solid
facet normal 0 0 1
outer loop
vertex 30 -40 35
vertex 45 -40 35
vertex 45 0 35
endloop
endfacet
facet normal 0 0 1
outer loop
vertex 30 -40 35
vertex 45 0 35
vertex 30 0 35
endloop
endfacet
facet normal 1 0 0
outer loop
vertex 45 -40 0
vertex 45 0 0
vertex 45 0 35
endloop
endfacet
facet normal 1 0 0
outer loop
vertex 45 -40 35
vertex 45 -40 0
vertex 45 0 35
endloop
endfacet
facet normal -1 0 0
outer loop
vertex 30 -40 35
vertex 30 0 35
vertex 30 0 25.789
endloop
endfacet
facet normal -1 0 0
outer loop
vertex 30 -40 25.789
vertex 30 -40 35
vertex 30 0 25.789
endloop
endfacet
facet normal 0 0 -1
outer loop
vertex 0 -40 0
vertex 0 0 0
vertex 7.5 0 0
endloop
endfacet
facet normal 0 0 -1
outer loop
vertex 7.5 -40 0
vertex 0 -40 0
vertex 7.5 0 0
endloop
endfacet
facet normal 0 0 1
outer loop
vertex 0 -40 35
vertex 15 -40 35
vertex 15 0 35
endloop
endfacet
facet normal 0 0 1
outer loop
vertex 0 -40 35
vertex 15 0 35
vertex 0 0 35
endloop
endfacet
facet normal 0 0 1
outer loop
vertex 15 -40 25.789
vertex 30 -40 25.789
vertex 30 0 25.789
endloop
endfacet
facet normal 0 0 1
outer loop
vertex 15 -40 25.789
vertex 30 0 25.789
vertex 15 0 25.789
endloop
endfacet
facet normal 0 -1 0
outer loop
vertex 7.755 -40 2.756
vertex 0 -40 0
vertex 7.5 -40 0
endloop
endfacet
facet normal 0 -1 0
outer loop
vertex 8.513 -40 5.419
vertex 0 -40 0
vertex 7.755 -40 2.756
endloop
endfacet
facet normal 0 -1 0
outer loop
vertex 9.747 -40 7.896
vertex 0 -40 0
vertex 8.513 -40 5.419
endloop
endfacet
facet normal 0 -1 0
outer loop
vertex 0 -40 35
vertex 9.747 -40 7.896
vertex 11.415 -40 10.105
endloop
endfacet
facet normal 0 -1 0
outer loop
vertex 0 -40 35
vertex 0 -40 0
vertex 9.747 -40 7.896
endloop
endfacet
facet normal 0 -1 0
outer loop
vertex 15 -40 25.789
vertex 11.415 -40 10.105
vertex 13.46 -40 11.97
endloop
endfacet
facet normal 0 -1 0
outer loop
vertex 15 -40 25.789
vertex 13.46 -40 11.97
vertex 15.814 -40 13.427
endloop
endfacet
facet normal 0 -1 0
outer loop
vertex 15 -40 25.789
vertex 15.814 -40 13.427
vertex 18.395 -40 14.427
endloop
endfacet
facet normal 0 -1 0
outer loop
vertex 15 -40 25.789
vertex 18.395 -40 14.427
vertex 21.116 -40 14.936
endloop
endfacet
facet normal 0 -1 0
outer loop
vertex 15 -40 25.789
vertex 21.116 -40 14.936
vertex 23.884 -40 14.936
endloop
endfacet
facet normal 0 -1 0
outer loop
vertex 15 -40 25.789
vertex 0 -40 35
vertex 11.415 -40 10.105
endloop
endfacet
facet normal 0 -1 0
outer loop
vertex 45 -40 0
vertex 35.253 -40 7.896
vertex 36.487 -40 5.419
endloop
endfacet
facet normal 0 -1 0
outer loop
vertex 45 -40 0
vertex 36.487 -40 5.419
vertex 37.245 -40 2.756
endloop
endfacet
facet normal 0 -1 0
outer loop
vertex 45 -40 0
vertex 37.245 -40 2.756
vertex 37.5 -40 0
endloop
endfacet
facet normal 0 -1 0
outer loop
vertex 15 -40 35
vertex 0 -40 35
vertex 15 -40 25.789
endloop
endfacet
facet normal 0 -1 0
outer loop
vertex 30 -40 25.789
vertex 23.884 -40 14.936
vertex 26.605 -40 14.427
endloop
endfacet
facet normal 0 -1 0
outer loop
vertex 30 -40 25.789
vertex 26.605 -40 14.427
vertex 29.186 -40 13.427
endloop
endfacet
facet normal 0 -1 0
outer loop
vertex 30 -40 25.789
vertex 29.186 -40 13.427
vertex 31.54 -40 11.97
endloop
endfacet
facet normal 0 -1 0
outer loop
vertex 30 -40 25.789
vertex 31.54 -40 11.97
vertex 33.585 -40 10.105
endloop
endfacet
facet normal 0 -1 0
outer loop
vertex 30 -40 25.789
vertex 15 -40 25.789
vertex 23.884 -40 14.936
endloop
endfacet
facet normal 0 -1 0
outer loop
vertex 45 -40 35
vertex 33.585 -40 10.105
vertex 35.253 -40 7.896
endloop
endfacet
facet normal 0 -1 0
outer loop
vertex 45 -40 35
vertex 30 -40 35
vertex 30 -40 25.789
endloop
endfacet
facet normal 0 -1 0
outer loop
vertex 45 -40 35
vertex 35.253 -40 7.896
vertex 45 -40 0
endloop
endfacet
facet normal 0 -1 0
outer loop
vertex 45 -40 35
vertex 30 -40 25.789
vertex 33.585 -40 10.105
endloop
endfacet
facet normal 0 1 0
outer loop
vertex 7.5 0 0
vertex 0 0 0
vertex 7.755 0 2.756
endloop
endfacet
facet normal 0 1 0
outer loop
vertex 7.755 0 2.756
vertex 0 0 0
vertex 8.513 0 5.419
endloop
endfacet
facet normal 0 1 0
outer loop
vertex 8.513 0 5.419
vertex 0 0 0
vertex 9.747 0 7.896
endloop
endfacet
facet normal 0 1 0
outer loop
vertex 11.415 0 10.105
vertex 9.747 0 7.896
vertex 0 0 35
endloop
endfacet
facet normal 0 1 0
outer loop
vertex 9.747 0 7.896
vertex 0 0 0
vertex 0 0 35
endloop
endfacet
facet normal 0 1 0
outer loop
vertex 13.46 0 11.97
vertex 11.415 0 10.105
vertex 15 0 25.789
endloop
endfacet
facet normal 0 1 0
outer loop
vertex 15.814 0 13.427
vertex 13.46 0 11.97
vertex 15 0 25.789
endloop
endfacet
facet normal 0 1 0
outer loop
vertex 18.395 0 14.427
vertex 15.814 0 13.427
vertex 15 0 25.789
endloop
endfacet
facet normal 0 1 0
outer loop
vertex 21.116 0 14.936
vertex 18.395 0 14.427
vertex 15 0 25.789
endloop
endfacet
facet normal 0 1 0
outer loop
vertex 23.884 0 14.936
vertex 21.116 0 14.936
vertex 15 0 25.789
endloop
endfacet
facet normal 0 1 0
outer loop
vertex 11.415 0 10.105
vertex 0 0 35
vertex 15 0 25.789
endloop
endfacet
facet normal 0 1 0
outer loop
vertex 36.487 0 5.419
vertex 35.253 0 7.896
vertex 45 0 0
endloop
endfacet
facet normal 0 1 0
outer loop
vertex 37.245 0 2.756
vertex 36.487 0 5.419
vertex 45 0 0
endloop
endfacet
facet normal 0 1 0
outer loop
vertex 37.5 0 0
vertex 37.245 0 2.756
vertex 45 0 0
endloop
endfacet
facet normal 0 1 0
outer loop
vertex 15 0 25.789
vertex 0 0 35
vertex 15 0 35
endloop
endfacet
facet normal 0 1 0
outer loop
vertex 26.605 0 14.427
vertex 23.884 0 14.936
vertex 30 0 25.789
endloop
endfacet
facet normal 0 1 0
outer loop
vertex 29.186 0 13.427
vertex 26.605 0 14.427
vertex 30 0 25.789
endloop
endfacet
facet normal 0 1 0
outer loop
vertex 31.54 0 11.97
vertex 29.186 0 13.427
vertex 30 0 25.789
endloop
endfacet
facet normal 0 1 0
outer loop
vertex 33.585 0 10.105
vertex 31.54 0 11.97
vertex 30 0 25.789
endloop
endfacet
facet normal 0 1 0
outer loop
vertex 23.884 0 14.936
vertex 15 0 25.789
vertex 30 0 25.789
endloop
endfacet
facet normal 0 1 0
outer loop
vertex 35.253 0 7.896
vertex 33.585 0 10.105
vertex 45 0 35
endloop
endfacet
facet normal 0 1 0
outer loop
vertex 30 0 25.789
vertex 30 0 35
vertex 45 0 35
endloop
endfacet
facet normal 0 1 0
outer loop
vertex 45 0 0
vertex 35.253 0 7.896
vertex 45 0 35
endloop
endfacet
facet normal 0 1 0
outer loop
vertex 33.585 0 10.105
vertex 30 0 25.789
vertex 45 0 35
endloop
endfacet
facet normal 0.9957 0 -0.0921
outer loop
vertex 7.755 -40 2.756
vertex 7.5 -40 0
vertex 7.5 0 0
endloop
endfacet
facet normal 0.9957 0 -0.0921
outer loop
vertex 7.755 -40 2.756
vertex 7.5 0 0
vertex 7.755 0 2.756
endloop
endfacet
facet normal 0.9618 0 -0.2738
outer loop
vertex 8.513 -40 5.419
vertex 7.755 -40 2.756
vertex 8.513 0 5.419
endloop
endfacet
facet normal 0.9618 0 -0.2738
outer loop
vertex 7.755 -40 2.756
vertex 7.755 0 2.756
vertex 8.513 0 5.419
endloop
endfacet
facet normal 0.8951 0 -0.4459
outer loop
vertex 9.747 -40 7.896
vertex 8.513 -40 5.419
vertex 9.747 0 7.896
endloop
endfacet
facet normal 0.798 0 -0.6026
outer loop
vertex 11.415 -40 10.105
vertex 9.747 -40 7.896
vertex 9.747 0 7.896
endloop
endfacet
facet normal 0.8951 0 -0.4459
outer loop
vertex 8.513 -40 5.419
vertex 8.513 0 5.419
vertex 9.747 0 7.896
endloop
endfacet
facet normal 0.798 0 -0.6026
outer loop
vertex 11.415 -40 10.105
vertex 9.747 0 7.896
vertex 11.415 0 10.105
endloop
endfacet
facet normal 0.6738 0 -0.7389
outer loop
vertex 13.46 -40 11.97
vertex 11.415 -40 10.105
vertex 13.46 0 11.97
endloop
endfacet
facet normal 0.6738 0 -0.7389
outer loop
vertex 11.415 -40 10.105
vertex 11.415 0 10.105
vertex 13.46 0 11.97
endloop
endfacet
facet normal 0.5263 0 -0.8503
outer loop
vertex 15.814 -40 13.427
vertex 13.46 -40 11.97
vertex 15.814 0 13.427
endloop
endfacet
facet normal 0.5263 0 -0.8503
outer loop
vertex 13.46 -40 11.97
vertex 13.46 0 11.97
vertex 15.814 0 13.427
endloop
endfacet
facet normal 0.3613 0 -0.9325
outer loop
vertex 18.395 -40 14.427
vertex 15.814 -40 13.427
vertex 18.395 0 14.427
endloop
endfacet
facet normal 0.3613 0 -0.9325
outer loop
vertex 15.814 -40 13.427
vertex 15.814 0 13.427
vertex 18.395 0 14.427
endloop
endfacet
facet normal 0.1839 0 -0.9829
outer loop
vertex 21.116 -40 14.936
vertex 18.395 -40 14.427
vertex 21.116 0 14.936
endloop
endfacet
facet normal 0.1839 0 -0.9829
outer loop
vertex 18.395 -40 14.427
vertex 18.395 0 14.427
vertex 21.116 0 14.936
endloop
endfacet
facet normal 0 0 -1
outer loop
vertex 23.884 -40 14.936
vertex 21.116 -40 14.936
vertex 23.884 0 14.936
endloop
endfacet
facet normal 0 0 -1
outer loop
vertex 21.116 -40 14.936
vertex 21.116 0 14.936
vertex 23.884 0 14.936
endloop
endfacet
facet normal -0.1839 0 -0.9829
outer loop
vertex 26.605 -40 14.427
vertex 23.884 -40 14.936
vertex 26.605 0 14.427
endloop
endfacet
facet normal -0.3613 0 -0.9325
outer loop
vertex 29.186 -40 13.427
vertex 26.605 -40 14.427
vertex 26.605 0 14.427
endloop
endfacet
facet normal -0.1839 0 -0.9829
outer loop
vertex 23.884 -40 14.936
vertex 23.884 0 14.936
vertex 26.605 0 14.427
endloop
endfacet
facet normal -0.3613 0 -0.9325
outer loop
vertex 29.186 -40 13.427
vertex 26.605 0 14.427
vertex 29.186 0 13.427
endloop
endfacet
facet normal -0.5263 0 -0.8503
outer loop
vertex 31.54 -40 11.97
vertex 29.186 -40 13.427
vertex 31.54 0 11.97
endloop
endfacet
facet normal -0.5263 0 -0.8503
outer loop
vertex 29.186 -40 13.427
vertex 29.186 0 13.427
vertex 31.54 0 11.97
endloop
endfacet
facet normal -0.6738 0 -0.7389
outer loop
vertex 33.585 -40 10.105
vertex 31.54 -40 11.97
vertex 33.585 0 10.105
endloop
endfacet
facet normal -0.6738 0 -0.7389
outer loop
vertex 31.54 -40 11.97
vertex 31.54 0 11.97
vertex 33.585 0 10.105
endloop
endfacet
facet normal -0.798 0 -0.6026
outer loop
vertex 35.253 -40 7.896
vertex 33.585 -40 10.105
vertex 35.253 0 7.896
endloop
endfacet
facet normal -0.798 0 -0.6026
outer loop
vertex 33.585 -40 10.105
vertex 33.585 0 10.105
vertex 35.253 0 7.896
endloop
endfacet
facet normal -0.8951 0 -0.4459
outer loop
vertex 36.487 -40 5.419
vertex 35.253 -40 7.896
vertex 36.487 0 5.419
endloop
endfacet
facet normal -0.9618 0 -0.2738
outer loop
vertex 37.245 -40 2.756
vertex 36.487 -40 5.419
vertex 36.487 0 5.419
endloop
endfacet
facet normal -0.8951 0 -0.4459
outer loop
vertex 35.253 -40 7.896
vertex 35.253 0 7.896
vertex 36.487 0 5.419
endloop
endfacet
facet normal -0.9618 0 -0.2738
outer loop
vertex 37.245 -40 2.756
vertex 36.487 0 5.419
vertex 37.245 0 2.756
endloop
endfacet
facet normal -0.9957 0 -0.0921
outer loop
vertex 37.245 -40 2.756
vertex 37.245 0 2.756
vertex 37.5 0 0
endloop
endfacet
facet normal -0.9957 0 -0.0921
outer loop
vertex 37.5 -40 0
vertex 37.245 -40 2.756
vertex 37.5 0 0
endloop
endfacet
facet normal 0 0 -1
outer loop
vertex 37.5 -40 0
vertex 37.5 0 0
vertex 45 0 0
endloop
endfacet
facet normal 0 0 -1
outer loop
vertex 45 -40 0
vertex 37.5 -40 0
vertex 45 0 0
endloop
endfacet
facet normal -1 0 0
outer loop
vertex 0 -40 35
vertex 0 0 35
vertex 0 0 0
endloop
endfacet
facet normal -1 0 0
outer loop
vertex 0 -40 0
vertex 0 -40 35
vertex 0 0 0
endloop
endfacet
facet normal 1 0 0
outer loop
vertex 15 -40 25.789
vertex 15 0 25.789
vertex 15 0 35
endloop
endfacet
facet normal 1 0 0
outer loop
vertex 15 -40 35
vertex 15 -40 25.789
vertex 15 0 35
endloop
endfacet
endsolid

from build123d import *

# Parameters (mm, degrees)
F1_DEPTH = 40


with BuildPart() as f1:
    # F0 (on Front) → F1 (new body)
    with BuildSketch(Plane.XZ):
        with BuildLine():
            Line((0, 35), (0, 0))
            Line((0, 0), (7.5, 0))
            ThreePointArc((7.5, 0), (22.5, 15), (37.5, 0))
            Line((37.5, 0), (45, 0))
            Line((45, 0), (45, 35))
            Line((45, 35), (30, 35))
            Line((30, 35), (30, 25.78854))
            Line((30, 25.78854), (15, 25.78854))
            Line((15, 25.78854), (15, 35))
            Line((15, 35), (0, 35))
        make_face()
    extrude(amount=F1_DEPTH)


solid = f1.part
